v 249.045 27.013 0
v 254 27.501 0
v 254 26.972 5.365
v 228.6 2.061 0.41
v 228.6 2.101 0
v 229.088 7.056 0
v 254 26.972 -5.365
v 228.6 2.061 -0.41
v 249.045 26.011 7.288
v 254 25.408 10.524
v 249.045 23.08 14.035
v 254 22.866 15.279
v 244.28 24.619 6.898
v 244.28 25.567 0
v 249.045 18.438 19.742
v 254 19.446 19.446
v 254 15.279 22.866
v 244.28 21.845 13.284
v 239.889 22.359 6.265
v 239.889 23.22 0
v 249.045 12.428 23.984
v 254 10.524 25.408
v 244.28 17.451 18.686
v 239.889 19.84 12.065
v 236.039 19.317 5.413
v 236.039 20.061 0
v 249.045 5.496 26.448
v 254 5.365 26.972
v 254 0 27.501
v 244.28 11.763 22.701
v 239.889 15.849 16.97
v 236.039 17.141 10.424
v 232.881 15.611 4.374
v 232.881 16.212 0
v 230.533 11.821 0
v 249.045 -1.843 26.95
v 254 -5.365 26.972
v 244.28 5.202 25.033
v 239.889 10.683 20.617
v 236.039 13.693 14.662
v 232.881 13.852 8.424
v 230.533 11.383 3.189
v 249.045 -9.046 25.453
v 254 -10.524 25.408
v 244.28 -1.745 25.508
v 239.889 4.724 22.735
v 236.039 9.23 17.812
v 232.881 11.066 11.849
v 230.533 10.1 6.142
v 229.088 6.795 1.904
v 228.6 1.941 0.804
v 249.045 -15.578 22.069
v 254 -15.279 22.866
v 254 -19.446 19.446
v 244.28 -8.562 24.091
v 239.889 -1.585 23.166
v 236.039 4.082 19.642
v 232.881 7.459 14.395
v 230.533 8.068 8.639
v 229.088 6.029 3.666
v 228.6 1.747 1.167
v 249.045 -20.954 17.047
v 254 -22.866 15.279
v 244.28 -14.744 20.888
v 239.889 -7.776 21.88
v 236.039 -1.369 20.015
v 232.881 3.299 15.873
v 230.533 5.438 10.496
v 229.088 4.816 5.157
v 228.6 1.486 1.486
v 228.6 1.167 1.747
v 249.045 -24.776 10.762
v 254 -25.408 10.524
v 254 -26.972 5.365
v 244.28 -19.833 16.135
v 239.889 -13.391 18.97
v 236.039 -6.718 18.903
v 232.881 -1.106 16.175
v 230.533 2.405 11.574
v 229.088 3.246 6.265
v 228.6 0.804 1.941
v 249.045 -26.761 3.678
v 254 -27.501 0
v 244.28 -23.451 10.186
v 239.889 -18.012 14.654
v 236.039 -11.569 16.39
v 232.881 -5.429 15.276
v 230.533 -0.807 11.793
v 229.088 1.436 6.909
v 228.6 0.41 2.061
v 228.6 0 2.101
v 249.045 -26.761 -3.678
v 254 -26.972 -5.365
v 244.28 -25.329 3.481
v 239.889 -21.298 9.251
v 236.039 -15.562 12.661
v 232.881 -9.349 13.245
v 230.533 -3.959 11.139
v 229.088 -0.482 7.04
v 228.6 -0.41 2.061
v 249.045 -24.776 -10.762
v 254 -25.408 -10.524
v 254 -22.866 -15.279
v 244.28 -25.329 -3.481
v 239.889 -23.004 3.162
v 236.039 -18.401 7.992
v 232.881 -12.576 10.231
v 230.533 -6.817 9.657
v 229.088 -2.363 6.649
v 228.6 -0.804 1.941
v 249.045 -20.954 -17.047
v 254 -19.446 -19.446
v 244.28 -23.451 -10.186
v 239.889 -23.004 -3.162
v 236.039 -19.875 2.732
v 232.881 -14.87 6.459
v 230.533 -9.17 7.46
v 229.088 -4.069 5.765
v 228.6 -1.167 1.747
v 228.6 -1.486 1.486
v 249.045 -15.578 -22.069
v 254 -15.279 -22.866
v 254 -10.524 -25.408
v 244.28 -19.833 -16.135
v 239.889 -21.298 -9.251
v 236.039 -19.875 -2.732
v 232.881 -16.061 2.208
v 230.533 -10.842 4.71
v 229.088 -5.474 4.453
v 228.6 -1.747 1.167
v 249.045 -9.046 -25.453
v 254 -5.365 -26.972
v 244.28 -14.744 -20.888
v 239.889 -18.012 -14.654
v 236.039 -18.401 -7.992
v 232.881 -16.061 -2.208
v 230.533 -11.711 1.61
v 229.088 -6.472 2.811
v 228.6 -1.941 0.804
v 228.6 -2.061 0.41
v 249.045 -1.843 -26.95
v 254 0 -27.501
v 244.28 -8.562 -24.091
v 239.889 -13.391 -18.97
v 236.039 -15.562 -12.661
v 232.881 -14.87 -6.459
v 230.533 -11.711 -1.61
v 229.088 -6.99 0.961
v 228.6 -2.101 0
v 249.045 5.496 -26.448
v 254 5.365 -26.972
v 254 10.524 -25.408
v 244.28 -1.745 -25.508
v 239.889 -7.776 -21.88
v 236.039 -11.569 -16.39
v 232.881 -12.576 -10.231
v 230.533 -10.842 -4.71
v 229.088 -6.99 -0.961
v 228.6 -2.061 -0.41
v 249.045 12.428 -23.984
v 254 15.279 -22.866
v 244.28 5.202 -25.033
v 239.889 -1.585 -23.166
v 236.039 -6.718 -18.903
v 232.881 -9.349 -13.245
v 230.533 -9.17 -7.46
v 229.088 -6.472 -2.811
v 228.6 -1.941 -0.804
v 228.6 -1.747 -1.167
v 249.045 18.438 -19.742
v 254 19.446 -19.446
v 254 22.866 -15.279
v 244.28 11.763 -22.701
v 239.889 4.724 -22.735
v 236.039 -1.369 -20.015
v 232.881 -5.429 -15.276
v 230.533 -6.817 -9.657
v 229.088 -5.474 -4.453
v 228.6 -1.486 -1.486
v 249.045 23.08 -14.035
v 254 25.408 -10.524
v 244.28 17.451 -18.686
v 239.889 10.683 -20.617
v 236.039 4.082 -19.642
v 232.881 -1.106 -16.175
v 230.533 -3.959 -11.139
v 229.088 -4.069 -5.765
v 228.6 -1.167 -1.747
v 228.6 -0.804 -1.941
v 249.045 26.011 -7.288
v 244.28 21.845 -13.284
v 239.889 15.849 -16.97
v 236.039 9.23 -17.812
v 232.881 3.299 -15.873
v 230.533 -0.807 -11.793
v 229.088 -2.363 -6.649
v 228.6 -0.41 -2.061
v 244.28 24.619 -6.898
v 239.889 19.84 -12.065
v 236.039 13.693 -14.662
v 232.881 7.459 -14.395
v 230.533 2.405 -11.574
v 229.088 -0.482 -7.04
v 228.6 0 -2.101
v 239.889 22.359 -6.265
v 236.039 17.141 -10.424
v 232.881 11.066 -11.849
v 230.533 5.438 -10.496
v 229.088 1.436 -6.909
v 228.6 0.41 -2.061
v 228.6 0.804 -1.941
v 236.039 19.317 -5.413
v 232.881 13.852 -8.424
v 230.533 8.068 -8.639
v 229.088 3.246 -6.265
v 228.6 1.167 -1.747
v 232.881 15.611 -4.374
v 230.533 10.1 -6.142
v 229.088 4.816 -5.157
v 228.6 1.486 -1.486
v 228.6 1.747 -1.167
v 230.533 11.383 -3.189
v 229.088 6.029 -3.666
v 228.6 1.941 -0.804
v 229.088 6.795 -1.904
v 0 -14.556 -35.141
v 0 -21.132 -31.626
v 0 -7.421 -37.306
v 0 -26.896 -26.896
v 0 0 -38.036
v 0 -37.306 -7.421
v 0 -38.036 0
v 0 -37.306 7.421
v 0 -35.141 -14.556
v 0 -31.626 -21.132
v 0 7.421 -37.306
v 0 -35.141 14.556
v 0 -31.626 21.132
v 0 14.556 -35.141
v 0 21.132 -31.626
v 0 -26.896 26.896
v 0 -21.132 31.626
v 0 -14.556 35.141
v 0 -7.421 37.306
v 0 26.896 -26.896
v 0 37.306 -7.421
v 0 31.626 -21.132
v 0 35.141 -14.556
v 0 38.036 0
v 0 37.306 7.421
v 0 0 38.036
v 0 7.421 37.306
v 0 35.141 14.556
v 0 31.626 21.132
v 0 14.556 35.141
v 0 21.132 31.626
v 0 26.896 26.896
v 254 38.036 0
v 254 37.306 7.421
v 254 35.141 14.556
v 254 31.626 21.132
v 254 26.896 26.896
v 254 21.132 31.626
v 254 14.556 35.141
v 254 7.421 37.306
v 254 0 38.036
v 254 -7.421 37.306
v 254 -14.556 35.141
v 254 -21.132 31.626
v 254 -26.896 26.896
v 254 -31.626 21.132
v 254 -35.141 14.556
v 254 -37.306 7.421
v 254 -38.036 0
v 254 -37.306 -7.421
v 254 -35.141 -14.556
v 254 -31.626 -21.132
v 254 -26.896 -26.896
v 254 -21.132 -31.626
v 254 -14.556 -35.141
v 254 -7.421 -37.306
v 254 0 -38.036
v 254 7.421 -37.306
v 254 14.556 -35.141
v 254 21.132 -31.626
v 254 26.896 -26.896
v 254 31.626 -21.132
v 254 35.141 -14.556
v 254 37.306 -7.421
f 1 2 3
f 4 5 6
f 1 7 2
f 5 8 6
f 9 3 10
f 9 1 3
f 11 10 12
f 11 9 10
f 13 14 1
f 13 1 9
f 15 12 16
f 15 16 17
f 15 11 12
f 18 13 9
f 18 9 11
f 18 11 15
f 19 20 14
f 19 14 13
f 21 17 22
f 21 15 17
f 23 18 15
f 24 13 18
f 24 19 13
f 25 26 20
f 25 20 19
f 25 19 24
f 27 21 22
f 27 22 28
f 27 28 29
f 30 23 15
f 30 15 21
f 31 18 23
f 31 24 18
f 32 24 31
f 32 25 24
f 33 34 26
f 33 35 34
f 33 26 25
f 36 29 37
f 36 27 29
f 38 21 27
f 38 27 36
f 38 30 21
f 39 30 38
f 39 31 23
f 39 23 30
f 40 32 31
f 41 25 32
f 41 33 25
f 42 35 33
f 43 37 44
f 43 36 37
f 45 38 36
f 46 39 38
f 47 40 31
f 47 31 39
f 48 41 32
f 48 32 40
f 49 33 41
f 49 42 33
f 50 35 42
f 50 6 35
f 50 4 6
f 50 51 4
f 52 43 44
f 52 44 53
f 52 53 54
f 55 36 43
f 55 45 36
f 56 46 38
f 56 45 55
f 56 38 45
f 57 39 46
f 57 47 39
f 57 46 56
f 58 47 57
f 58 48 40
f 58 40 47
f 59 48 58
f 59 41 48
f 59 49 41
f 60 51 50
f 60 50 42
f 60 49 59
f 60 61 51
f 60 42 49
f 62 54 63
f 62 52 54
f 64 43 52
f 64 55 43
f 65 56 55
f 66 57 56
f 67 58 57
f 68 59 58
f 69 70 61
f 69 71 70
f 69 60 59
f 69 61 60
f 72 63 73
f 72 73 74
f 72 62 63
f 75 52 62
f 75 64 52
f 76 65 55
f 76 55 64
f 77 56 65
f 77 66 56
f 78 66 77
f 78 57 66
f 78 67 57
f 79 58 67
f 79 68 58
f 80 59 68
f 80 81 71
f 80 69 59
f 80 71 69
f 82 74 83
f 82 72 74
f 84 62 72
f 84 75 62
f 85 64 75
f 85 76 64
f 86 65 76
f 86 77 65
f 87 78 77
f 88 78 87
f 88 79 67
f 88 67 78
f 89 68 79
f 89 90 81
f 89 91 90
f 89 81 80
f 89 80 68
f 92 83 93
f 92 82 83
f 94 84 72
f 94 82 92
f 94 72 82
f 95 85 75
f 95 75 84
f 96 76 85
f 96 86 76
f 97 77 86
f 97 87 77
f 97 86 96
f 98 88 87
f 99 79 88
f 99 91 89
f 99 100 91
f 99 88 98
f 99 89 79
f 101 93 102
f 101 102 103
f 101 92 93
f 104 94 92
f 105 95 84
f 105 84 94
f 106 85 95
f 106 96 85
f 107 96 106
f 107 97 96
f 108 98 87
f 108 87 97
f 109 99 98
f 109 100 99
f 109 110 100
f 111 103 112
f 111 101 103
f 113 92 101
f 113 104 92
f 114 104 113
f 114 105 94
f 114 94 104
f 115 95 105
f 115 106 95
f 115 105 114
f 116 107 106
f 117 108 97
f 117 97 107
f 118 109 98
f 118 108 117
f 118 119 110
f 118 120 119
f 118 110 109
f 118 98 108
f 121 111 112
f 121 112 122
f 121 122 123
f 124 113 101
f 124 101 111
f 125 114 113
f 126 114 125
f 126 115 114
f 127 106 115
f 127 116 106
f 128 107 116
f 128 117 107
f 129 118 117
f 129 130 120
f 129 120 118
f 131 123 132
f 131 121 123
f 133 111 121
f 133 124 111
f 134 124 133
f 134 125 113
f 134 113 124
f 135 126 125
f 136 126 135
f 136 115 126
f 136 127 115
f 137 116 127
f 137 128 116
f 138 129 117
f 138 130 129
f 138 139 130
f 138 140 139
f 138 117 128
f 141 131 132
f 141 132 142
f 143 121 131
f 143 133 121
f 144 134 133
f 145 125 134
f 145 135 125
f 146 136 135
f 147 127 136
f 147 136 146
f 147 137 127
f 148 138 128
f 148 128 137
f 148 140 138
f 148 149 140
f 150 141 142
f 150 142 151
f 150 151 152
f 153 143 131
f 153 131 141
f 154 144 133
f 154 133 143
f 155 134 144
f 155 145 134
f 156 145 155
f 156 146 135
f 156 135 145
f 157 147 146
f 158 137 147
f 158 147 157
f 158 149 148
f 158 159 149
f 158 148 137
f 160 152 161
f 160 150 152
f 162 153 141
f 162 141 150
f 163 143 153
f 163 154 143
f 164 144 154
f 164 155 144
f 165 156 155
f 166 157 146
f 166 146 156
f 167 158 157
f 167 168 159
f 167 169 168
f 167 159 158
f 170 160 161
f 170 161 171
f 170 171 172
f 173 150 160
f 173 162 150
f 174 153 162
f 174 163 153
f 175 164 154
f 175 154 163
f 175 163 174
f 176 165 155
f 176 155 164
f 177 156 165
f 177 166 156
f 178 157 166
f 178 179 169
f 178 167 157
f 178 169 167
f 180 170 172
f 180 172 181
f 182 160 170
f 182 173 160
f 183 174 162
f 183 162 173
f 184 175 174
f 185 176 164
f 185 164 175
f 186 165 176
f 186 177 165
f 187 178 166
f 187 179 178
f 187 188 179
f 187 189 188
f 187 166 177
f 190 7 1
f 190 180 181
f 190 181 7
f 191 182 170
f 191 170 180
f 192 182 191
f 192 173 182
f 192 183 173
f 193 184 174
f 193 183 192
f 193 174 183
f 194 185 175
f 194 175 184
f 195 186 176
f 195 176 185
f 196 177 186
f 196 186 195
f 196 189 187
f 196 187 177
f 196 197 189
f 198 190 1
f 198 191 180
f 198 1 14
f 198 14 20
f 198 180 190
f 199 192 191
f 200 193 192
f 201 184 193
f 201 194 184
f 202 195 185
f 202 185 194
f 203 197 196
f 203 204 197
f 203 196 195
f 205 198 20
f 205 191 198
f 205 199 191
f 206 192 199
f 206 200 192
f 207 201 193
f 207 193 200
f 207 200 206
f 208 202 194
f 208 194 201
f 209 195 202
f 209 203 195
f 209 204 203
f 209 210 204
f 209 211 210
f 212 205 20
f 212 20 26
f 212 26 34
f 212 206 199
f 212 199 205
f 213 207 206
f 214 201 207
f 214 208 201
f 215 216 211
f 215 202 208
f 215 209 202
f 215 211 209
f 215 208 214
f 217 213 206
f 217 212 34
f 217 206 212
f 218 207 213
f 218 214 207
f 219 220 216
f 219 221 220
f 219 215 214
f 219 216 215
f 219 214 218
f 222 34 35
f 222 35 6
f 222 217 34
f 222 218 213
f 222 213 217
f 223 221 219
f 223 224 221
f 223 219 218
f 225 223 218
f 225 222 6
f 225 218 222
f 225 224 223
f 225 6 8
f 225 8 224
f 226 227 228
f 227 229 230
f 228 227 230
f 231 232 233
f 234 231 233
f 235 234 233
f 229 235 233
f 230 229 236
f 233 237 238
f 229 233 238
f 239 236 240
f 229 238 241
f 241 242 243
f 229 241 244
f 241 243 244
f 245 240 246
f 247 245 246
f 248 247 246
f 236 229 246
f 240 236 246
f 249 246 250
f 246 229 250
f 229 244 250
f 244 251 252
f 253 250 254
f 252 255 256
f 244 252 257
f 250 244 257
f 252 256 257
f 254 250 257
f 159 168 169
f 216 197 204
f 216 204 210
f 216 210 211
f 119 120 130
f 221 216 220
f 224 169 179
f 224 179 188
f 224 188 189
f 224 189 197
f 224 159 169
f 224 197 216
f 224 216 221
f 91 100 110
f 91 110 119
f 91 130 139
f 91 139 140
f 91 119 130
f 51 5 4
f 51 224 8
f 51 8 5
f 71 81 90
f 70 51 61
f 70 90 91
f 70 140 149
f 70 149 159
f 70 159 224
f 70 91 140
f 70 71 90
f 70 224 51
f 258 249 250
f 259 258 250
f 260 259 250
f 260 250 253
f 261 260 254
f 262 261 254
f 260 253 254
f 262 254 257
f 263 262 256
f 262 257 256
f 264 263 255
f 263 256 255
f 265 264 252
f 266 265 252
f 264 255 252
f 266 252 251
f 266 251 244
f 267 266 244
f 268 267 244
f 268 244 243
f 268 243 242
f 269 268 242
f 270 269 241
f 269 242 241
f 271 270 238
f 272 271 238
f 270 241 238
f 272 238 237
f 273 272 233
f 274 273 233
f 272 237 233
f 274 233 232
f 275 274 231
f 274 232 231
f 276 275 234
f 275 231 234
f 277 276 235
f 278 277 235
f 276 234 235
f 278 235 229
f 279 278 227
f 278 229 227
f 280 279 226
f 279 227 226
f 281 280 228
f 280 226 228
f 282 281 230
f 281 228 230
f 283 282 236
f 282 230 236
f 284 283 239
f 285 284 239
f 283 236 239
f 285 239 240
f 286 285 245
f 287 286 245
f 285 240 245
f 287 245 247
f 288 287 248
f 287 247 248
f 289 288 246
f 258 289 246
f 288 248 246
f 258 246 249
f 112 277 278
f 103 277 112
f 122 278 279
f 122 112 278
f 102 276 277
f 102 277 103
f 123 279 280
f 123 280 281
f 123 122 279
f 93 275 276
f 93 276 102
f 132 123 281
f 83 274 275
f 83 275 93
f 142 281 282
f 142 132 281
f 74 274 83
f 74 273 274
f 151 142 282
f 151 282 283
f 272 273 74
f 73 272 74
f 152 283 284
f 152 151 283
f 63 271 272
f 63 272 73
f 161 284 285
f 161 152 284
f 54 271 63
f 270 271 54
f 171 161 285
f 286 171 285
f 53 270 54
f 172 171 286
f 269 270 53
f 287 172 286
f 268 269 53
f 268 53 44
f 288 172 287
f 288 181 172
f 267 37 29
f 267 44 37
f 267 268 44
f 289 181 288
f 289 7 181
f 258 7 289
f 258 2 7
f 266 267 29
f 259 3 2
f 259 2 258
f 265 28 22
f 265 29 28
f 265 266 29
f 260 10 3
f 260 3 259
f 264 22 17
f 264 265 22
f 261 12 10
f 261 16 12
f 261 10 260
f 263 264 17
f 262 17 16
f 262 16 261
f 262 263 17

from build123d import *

# Parameters (mm, degrees)
F0_R     = 38.0365
F1_DEPTH = 254
F2_R     = 27.5008894084
F3_DEPTH = 25.4
F4_R     = 25.39999


# Not quite as in the source:
# - a fillet or chamfer is up to 0.001 mm smaller than in the source, because OpenCascade refuses the exact size


with BuildPart() as f1:
    # F0 (on Right) → F1 (new body)
    with BuildSketch(Plane.YZ):
        Circle(F0_R)
    extrude(amount=F1_DEPTH)

    # F2 (on face) → F3 (cut)
    with BuildSketch(Plane.YZ.offset(254)):
        Circle(F2_R)
    extrude(amount=-F3_DEPTH, mode=Mode.SUBTRACT)

    # F4 (radius 25.4 in the source; OpenCascade refuses exactly that, so slightly less here)
    f4_edges = [f1.edges().sort_by_distance(p)[0] for p in [
        (228.6, -27.500889, 0),
    ]]
    fillet(f4_edges, radius=F4_R)


solid = f1.part
